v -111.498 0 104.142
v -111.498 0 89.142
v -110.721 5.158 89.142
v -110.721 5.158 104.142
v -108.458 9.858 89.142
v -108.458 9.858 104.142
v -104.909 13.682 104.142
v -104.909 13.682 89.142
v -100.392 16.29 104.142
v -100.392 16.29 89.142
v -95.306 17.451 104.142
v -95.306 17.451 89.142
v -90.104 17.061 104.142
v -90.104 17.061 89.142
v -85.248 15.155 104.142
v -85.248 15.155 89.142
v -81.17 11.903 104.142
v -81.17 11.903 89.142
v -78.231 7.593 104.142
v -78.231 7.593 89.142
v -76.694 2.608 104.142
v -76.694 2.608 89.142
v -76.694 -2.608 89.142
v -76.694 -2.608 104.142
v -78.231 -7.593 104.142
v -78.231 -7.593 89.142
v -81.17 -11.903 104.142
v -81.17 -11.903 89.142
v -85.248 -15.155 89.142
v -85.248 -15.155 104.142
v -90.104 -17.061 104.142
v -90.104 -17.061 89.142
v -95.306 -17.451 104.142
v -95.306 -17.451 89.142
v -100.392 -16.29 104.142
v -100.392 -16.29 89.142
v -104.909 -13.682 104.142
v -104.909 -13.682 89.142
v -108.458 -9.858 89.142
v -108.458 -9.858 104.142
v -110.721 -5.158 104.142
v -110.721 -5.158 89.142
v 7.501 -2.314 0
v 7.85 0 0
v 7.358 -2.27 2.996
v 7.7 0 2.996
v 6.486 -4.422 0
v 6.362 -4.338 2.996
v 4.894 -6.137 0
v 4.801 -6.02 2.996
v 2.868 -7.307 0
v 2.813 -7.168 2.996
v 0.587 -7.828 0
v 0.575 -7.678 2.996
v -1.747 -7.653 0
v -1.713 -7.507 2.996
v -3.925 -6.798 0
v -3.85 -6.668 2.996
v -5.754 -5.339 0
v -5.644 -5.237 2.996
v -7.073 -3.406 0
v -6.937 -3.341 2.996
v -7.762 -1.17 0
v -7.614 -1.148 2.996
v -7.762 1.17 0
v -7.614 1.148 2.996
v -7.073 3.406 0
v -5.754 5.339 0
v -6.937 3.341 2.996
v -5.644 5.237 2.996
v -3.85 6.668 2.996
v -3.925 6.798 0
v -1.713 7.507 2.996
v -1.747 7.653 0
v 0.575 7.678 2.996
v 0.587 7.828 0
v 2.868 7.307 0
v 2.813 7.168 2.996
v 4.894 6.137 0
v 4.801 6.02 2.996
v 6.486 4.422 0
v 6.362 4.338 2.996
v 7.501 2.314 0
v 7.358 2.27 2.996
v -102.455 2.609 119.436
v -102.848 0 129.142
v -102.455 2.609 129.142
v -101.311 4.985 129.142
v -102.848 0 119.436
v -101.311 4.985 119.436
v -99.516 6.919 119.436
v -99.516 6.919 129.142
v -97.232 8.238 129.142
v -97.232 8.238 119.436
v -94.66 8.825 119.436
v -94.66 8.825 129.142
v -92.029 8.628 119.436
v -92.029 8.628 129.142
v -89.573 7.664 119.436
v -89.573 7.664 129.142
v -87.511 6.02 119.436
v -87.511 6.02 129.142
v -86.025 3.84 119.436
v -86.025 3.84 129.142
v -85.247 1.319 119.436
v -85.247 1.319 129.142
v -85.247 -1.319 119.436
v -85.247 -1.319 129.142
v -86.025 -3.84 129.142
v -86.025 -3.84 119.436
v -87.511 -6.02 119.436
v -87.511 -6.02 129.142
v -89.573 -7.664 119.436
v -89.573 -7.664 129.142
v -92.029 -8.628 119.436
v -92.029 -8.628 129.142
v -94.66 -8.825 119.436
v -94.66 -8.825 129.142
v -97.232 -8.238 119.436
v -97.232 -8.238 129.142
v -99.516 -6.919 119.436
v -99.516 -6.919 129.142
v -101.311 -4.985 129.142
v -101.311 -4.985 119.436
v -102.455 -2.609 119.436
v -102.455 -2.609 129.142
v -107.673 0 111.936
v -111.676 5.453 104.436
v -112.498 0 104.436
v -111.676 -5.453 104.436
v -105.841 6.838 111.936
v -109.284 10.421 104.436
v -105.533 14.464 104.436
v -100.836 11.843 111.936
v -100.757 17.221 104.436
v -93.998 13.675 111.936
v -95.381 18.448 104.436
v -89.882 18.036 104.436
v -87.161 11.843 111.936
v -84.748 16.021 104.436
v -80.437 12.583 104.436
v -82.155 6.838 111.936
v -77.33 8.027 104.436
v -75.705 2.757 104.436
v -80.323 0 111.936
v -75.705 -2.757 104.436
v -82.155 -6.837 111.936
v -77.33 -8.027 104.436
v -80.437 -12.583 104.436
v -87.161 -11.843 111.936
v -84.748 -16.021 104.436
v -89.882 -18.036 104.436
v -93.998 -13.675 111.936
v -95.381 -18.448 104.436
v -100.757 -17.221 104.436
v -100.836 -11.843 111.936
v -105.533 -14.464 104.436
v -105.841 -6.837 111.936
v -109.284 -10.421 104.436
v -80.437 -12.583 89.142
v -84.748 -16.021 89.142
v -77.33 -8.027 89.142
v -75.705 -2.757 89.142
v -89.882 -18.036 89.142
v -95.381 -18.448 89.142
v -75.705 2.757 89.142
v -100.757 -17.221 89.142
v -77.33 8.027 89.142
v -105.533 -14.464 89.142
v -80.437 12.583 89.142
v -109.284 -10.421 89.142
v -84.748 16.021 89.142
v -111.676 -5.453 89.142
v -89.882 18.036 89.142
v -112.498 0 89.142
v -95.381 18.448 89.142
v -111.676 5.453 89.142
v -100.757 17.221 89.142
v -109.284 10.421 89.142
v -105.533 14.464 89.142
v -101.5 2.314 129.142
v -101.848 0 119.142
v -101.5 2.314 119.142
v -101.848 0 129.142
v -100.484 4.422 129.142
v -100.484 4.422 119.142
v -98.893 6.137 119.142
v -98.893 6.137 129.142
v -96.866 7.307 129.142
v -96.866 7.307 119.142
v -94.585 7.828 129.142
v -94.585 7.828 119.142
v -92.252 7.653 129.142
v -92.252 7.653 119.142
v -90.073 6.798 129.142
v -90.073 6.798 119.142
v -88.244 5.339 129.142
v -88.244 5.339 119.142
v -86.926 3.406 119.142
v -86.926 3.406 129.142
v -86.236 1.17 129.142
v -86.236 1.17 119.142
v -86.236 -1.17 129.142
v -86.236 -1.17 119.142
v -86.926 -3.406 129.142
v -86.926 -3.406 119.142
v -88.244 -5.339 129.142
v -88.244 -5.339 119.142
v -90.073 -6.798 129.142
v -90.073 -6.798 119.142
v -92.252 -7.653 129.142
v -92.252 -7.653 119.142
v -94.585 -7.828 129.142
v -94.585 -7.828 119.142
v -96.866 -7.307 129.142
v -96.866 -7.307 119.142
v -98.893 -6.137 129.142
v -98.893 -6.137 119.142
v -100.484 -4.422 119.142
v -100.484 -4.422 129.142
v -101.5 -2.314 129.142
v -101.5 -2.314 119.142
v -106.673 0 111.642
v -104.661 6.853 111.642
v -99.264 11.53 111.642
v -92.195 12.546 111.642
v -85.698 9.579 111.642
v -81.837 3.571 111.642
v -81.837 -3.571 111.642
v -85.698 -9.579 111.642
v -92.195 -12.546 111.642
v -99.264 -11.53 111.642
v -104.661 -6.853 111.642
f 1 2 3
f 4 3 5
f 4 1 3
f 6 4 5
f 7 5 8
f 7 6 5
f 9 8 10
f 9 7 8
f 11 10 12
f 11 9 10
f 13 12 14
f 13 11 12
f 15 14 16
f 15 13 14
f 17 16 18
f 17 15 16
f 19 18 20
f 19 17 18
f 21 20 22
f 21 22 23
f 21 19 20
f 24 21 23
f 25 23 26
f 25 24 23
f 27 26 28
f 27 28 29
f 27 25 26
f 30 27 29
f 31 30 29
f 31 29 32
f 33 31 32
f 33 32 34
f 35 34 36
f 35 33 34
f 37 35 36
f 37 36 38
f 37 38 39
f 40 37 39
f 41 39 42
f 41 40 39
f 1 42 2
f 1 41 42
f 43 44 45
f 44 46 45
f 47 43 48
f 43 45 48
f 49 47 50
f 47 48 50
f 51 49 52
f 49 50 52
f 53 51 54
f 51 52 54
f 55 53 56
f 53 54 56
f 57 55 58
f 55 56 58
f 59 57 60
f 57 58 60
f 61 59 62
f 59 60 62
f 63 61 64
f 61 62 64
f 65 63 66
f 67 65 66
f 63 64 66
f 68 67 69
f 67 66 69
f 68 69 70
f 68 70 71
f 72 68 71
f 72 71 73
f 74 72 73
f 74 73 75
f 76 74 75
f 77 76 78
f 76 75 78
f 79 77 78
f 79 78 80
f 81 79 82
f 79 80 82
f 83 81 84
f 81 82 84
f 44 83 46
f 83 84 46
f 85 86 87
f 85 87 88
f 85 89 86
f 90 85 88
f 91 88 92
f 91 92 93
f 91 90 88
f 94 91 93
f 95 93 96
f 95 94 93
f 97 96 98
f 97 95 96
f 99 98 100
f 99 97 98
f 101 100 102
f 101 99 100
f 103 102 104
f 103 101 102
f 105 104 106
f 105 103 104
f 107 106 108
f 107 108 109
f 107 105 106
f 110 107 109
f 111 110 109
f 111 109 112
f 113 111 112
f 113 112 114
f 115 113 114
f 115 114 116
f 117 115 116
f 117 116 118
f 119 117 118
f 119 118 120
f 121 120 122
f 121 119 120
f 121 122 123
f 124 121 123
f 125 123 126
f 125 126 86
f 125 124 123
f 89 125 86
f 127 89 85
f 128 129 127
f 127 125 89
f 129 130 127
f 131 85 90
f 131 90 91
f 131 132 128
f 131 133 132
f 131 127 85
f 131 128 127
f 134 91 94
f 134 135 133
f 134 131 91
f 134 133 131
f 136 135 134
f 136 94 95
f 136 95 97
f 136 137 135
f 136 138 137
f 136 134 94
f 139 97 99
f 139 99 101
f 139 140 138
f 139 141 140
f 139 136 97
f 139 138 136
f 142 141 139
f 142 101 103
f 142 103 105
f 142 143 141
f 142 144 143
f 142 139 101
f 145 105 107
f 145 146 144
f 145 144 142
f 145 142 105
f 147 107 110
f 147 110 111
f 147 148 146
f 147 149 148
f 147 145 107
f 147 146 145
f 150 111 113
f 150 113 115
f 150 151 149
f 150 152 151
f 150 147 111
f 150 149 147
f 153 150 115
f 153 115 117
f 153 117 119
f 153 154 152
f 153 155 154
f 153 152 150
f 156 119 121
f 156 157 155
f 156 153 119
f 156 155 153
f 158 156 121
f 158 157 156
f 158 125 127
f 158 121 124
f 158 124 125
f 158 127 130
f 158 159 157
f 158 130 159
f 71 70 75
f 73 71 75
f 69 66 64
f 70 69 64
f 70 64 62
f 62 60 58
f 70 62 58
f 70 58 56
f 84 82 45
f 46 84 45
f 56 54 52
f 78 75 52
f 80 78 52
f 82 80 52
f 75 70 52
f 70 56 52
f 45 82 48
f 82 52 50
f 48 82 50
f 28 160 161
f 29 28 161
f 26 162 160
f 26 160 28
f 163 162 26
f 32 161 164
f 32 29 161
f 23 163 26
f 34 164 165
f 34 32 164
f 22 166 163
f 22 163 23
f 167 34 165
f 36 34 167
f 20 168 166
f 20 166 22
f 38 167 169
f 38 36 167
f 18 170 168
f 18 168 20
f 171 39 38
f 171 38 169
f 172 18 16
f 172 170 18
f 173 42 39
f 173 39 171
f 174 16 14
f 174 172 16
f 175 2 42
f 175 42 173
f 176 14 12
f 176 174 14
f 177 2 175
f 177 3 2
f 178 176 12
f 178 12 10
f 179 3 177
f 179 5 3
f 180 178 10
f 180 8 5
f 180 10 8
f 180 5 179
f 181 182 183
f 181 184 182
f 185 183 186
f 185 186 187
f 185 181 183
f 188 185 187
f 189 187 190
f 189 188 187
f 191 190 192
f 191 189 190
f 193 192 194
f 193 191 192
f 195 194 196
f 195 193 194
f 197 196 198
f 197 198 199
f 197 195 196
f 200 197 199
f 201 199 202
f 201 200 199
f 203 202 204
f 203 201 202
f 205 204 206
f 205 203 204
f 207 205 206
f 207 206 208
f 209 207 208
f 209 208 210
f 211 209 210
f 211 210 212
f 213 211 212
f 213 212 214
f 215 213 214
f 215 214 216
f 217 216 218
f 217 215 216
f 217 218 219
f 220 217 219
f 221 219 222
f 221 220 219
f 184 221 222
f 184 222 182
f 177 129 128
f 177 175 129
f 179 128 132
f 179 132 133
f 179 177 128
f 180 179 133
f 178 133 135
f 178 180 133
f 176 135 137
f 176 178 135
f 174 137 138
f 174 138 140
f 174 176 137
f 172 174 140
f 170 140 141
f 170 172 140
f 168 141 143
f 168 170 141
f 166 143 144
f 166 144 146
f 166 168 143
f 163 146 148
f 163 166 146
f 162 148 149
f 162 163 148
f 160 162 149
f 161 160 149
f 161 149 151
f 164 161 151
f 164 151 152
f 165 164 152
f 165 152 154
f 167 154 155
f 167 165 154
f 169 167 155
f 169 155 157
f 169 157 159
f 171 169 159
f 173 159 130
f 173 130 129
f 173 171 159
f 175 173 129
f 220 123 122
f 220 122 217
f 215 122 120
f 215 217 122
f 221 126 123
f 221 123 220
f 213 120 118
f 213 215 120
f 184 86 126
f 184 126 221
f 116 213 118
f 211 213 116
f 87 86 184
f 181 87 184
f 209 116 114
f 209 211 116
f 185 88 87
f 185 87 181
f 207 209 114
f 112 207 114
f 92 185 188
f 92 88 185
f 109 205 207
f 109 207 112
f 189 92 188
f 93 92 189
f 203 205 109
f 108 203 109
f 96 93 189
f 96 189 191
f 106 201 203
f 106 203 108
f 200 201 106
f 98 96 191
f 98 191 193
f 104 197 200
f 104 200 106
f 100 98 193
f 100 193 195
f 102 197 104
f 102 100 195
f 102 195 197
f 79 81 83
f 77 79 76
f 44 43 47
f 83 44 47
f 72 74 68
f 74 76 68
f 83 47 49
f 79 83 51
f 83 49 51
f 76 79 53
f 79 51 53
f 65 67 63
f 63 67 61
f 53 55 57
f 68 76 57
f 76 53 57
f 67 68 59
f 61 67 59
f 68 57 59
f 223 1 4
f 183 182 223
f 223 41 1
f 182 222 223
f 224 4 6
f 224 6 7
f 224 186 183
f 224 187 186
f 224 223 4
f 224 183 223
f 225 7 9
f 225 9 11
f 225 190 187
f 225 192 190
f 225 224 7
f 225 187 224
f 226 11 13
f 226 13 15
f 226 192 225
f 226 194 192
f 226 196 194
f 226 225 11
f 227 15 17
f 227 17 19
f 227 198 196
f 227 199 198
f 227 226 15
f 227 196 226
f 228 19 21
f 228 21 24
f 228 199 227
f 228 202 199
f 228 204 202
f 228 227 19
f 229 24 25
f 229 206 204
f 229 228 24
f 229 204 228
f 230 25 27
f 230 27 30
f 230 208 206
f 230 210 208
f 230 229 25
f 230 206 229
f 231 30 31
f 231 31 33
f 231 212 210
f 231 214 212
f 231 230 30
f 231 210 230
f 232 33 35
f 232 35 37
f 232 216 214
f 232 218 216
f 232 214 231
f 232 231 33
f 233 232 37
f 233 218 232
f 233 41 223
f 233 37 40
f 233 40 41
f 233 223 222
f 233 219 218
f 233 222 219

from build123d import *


with BuildPart() as f1:
    # F0 (on Front) → F1 (revolve)
    with BuildSketch(Plane.XZ):
        Polygon((7.85, 0), (7.7, 2.996248), (0, 2.996248), (0, 0), align=None)
    revolve(axis=Axis((0, 0, 1.498124), (0, 0, -1)))


with BuildPart() as f2:
    # F0 (on Front) → F2 (revolve)
    with BuildSketch(Plane.XZ):
        Polygon((-101.848397, 119.141754), (-101.848397, 129.141754), (-102.848397, 129.141754), (-102.848397, 119.435639), (-112.498397, 104.435639), (-112.498397, 89.141754), (-111.498397, 89.141754), (-111.498397, 104.141754), align=None)
    revolve(axis=Axis((-93.998397, 0, 104.049748), (0, 0, -1)))


solid = Compound([f1.part, f2.part])
